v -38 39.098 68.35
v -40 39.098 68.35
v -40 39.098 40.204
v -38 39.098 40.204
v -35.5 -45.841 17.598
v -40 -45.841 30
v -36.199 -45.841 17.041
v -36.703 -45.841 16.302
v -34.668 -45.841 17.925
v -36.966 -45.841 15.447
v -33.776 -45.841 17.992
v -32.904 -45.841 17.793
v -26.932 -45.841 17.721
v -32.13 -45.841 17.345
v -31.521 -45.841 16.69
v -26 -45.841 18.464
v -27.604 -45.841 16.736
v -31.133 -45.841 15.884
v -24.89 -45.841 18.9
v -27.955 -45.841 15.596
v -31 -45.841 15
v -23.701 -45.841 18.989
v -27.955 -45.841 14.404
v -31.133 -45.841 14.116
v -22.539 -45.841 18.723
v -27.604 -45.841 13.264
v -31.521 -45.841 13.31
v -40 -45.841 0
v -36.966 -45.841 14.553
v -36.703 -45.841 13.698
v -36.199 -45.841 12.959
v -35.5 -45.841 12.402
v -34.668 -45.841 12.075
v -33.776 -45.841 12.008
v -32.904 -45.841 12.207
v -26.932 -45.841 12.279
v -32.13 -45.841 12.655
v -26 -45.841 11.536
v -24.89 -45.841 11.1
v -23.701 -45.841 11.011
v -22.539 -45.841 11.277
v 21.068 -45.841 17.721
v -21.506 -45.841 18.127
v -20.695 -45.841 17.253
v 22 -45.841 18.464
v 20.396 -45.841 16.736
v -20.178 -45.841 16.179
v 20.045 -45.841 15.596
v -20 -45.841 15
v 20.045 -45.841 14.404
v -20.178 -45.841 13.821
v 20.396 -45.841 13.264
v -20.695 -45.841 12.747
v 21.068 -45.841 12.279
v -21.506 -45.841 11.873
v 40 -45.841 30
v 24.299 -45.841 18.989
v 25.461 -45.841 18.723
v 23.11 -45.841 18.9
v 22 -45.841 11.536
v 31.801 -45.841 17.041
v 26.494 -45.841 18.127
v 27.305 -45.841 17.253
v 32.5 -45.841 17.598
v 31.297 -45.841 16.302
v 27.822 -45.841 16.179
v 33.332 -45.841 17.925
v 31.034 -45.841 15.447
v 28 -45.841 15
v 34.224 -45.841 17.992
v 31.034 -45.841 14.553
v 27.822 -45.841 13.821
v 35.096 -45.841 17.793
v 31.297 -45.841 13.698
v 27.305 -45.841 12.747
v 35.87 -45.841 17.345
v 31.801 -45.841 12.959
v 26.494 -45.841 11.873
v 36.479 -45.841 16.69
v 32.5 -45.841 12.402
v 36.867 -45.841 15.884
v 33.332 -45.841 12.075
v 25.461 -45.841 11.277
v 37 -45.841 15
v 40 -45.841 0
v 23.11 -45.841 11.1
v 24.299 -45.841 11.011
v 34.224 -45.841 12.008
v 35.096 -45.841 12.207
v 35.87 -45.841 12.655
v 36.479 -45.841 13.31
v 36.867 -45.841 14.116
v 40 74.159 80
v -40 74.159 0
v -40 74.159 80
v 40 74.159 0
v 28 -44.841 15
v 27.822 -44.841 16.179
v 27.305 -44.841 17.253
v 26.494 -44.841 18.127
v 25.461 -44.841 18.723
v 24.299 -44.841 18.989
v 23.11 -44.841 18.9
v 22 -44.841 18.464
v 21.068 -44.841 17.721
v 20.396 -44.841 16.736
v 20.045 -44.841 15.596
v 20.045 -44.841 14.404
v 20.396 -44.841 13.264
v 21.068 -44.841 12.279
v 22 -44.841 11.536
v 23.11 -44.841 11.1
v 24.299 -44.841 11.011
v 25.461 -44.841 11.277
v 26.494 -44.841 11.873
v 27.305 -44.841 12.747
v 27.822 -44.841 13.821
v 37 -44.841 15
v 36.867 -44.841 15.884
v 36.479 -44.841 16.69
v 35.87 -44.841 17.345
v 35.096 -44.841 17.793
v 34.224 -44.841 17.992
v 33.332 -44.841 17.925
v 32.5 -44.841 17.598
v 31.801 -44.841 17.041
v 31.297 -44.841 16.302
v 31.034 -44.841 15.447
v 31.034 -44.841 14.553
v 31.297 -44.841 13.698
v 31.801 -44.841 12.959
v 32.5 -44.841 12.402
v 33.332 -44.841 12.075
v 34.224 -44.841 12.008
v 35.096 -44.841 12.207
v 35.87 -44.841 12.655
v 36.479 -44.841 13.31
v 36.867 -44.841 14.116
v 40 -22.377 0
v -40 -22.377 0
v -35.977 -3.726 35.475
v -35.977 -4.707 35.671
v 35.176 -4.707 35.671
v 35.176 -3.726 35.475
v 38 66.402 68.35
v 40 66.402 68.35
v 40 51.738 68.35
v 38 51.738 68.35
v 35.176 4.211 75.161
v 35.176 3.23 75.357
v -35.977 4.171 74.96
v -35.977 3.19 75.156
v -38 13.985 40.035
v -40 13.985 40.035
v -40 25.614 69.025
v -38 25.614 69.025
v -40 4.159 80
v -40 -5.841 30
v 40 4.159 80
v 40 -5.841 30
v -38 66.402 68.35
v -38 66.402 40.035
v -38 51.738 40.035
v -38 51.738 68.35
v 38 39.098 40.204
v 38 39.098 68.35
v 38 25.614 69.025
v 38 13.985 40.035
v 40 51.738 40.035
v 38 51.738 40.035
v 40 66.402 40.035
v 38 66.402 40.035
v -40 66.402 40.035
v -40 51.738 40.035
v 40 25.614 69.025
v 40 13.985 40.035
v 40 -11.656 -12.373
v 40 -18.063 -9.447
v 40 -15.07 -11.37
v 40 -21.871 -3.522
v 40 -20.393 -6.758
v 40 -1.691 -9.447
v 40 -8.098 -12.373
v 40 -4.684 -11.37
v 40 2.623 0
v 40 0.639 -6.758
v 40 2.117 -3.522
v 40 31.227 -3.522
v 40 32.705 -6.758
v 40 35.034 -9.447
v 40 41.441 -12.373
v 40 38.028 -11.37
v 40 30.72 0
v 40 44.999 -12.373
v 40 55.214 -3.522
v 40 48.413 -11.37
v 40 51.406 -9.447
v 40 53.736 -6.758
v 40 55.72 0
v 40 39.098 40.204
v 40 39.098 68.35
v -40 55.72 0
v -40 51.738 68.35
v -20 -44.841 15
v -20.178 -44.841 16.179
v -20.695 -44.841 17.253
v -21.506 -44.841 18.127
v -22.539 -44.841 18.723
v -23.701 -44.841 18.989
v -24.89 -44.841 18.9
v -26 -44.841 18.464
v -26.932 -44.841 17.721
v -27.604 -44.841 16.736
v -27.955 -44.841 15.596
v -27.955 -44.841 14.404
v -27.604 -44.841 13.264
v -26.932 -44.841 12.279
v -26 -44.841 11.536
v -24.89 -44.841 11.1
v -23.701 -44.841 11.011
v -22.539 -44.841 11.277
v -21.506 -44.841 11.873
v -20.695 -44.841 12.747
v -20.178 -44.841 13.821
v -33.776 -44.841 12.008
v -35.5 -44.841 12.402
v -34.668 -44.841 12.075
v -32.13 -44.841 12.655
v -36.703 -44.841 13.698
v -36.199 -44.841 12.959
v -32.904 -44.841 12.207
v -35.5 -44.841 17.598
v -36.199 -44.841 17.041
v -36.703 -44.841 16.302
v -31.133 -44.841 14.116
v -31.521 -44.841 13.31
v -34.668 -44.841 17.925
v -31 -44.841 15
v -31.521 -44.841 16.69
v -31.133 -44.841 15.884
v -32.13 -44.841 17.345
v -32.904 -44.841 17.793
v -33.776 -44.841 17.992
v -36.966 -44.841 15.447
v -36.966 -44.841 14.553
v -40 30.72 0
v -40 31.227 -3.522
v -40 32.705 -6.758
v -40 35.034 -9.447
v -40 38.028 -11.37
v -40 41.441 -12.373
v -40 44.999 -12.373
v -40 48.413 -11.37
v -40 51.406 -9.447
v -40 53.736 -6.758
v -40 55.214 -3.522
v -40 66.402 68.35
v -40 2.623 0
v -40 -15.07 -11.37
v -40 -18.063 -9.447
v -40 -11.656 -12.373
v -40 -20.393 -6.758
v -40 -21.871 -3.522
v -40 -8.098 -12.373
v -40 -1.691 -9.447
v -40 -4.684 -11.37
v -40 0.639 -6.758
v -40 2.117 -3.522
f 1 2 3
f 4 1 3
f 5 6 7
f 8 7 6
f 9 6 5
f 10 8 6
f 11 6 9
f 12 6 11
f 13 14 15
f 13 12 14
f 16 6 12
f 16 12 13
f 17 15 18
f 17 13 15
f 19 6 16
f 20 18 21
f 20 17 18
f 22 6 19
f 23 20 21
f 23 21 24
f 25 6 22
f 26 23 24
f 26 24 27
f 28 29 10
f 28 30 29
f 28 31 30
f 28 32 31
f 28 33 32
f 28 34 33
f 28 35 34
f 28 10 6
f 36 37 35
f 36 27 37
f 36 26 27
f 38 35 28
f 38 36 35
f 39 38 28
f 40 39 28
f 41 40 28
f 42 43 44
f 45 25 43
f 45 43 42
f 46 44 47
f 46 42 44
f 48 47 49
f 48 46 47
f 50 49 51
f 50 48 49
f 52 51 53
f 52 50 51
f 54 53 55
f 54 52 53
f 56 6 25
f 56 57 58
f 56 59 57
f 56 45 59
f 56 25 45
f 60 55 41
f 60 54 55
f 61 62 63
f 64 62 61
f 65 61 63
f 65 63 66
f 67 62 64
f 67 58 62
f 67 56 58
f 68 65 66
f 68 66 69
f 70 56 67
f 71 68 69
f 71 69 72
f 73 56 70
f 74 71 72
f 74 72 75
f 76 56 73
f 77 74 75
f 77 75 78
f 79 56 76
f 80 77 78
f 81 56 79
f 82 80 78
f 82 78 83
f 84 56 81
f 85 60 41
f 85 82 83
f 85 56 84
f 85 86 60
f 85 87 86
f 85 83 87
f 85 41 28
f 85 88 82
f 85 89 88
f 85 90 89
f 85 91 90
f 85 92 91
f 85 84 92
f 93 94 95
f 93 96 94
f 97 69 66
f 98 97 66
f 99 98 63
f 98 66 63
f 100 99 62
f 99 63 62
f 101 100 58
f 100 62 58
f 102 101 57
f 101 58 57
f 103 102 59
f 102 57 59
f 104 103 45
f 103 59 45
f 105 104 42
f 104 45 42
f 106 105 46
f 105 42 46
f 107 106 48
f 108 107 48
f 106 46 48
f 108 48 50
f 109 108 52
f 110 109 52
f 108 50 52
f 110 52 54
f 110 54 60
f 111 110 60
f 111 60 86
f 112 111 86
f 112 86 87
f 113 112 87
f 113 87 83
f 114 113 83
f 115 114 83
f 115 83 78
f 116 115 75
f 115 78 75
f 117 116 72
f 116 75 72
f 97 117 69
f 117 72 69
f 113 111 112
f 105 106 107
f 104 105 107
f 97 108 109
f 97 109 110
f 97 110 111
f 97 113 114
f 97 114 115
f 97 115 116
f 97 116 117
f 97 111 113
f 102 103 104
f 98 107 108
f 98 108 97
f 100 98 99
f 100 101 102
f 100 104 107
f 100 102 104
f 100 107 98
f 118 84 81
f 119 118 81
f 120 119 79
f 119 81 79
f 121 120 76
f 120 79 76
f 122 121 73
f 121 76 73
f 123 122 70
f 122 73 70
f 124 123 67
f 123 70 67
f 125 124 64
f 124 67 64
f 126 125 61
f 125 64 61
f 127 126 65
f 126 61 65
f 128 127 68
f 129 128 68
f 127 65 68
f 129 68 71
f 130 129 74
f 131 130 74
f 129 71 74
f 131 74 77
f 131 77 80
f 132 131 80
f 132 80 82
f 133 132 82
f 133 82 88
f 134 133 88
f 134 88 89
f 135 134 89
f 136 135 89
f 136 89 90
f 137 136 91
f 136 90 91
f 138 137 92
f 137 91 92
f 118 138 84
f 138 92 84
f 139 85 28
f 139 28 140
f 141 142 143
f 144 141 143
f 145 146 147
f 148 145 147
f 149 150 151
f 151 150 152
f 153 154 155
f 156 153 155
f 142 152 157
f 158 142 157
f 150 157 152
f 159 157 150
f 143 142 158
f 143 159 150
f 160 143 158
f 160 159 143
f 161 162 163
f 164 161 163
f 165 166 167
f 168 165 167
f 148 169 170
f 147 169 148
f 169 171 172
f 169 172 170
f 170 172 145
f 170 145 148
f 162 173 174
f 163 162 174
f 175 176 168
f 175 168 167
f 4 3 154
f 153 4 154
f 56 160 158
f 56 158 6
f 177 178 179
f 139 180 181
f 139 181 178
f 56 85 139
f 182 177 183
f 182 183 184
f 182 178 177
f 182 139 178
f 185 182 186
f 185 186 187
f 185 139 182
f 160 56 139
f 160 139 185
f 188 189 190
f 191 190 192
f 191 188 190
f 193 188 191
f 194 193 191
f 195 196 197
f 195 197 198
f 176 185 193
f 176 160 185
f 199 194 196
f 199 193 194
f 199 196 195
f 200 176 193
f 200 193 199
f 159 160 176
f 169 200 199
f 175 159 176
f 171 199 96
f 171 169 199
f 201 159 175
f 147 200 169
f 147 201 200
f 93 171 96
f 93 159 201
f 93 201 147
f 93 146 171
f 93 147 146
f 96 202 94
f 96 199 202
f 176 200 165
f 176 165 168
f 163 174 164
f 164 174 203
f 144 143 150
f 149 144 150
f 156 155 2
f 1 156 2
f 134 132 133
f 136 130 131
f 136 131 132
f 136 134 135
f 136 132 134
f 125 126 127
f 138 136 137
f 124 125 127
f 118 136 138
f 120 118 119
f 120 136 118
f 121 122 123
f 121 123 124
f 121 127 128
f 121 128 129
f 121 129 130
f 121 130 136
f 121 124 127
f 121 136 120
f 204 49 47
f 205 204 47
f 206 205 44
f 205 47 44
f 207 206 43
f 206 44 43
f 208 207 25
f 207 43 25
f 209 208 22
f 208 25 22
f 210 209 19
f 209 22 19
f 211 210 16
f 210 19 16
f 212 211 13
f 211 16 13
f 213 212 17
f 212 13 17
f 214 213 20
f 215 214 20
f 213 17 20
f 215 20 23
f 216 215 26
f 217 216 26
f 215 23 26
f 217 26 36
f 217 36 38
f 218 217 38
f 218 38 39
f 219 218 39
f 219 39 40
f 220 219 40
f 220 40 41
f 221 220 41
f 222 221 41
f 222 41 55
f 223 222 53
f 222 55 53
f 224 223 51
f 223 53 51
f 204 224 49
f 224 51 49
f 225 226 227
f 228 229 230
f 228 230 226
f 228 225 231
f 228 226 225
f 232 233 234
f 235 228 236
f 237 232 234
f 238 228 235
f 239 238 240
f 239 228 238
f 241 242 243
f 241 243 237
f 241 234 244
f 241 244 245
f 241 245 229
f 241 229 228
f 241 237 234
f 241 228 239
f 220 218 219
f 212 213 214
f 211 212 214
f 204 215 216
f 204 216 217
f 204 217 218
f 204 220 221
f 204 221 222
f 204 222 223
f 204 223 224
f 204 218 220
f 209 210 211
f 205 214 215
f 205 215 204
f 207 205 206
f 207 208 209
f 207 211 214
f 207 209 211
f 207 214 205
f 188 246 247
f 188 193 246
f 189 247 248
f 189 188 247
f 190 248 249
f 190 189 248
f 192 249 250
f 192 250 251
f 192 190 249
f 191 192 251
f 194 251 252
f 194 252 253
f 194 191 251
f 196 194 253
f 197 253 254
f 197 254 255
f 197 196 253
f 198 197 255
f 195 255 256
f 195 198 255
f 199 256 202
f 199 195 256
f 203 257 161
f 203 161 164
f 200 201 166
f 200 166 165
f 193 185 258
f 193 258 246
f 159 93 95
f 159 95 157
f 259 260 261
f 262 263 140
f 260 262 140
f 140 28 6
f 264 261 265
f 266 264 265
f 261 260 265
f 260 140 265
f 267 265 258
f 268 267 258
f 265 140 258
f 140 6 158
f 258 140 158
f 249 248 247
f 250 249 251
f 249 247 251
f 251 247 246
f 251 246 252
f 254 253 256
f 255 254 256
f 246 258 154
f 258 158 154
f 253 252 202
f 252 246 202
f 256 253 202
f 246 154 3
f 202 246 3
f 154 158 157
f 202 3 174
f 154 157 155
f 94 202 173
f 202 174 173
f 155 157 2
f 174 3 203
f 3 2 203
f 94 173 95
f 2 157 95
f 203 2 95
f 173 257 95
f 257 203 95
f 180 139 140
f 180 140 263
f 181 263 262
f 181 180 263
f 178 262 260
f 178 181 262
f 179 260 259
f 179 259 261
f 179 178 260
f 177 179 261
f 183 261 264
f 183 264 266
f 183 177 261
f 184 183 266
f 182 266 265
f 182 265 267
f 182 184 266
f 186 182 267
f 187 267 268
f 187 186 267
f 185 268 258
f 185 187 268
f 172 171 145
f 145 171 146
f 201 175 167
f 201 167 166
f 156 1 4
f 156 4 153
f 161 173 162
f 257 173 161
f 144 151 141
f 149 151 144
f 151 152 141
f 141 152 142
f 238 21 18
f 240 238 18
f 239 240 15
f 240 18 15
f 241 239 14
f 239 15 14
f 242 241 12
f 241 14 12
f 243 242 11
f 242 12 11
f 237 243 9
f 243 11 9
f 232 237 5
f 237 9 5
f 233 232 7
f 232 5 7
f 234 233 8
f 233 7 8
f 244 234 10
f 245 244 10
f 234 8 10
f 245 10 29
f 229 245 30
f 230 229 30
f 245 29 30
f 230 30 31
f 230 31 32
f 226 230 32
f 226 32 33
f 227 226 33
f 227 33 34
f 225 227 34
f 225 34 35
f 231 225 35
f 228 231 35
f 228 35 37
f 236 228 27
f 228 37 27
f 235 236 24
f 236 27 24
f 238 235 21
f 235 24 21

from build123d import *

# Parameters (mm, degrees)
F1_DEPTH = 40
F2_W     = 14.6631337702
F2_H     = 28.3150114119
F3_DEPTH = 2
F5_DEPTH = 1
F6_R     = 3
F6_R_2   = 4
F7_DEPTH = 1


# Not quite as in the source:
# - a pattern or mirror of a feature is missing from the dataset's text; its kind, count and spacing are read off the source's solid


with BuildPart() as f1:
    # F0 (on Right) → F1 (new body, symmetric)
    with BuildSketch(Plane.YZ):
        with BuildLine():
            Line((74.1590947979, 0), (74.1590947979, 80))
            Line((74.1590947979, 80), (4.1590947979, 80))
            Line((4.1590947979, 80), (-5.8409052021, 30))
            Line((-5.8409052021, 30), (-45.8409052021, 30))
            Line((-45.8409052021, 30), (-45.8409052021, 0))
            Line((-45.8409052021, 0), (-22.3770336471, 0))
            ThreePointArc((-22.3770336471, 0), (-9.8770336471, 12.5), (2.6229663529, 0))
            Line((2.6229663529, 0), (30.7202589484, 0))
            ThreePointArc((30.7202589484, 0), (43.2202589484, 12.5), (55.7202589484, 0))
            Line((55.7202589484, 0), (74.1590947979, 0))
        make_face()
        with BuildLine():
            ThreePointArc((30.7202589484, 0), (43.2202589484, -12.5), (55.7202589484, 0))
            Line((55.7202589484, 0), (30.7202589484, 0))
        make_face()
        with BuildLine():
            Line((30.7202589484, 0), (55.7202589484, 0))
            ThreePointArc((55.7202589484, 0), (43.2202589484, 12.5), (30.7202589484, 0))
        make_face()
        with BuildLine():
            ThreePointArc((-22.3770336471, 0), (-9.8770336471, -12.5), (2.6229663529, 0))
            Line((2.6229663529, 0), (-22.3770336471, 0))
        make_face()
        with BuildLine():
            Line((-22.3770336471, 0), (2.6229663529, 0))
            ThreePointArc((2.6229663529, 0), (-9.8770336471, 12.5), (-22.3770336471, 0))
        make_face()
    extrude(amount=F1_DEPTH, both=True)

    # F2 (on face) → F3 (cut)
    with BuildSketch(Plane(origin=(-40, 0, 0), x_dir=(0, -1, 0), z_dir=(-1, 0, 0))):
        Polygon((-13.9850862324, 40.0354526937), (-25.6144665182, 69.0246298909), (-39.0978083014, 68.3504641056), (-39.0978083014, 40.2039922774), align=None)
        with Locations((-59.0700041503, 54.1929583997)):
            Rectangle(F2_W, F2_H)
    f3 = extrude(amount=-F3_DEPTH, mode=Mode.SUBTRACT)

    # F3_copies: F3 across plane
    add(f3.mirror(Plane(origin=(0, 0, 0), x_dir=(0, 0, 1), z_dir=(1, 0, 0))), mode=Mode.SUBTRACT)

    # F4 (on face) → F5 (cut, symmetric)
    with BuildSketch(Plane(origin=(0, -11.3854857713, 2.2770971543), x_dir=(1, 0, 0), z_dir=(0, -0.9805806757, 0.1961161351))):
        Polygon((35.1756438613, 74.5268389583), (-35.977371037, 74.3224471807), (-35.977371037, 34.0555720031), (35.1756438613, 34.0555720031), align=None)
    extrude(amount=F5_DEPTH, both=True, mode=Mode.SUBTRACT)

    # F6 (on face) → F7 (cut, symmetric)
    with BuildSketch(Plane.XZ.offset(45.8409052021)):
        with Locations((-34, 15)):
            Circle(F6_R)
        with Locations((-24, 15)):
            Circle(F6_R_2)
        with Locations((24, 15)):
            Circle(F6_R_2)
        with Locations((34, 15)):
            Circle(F6_R)
    extrude(amount=F7_DEPTH, both=True, mode=Mode.SUBTRACT)


solid = f1.part
